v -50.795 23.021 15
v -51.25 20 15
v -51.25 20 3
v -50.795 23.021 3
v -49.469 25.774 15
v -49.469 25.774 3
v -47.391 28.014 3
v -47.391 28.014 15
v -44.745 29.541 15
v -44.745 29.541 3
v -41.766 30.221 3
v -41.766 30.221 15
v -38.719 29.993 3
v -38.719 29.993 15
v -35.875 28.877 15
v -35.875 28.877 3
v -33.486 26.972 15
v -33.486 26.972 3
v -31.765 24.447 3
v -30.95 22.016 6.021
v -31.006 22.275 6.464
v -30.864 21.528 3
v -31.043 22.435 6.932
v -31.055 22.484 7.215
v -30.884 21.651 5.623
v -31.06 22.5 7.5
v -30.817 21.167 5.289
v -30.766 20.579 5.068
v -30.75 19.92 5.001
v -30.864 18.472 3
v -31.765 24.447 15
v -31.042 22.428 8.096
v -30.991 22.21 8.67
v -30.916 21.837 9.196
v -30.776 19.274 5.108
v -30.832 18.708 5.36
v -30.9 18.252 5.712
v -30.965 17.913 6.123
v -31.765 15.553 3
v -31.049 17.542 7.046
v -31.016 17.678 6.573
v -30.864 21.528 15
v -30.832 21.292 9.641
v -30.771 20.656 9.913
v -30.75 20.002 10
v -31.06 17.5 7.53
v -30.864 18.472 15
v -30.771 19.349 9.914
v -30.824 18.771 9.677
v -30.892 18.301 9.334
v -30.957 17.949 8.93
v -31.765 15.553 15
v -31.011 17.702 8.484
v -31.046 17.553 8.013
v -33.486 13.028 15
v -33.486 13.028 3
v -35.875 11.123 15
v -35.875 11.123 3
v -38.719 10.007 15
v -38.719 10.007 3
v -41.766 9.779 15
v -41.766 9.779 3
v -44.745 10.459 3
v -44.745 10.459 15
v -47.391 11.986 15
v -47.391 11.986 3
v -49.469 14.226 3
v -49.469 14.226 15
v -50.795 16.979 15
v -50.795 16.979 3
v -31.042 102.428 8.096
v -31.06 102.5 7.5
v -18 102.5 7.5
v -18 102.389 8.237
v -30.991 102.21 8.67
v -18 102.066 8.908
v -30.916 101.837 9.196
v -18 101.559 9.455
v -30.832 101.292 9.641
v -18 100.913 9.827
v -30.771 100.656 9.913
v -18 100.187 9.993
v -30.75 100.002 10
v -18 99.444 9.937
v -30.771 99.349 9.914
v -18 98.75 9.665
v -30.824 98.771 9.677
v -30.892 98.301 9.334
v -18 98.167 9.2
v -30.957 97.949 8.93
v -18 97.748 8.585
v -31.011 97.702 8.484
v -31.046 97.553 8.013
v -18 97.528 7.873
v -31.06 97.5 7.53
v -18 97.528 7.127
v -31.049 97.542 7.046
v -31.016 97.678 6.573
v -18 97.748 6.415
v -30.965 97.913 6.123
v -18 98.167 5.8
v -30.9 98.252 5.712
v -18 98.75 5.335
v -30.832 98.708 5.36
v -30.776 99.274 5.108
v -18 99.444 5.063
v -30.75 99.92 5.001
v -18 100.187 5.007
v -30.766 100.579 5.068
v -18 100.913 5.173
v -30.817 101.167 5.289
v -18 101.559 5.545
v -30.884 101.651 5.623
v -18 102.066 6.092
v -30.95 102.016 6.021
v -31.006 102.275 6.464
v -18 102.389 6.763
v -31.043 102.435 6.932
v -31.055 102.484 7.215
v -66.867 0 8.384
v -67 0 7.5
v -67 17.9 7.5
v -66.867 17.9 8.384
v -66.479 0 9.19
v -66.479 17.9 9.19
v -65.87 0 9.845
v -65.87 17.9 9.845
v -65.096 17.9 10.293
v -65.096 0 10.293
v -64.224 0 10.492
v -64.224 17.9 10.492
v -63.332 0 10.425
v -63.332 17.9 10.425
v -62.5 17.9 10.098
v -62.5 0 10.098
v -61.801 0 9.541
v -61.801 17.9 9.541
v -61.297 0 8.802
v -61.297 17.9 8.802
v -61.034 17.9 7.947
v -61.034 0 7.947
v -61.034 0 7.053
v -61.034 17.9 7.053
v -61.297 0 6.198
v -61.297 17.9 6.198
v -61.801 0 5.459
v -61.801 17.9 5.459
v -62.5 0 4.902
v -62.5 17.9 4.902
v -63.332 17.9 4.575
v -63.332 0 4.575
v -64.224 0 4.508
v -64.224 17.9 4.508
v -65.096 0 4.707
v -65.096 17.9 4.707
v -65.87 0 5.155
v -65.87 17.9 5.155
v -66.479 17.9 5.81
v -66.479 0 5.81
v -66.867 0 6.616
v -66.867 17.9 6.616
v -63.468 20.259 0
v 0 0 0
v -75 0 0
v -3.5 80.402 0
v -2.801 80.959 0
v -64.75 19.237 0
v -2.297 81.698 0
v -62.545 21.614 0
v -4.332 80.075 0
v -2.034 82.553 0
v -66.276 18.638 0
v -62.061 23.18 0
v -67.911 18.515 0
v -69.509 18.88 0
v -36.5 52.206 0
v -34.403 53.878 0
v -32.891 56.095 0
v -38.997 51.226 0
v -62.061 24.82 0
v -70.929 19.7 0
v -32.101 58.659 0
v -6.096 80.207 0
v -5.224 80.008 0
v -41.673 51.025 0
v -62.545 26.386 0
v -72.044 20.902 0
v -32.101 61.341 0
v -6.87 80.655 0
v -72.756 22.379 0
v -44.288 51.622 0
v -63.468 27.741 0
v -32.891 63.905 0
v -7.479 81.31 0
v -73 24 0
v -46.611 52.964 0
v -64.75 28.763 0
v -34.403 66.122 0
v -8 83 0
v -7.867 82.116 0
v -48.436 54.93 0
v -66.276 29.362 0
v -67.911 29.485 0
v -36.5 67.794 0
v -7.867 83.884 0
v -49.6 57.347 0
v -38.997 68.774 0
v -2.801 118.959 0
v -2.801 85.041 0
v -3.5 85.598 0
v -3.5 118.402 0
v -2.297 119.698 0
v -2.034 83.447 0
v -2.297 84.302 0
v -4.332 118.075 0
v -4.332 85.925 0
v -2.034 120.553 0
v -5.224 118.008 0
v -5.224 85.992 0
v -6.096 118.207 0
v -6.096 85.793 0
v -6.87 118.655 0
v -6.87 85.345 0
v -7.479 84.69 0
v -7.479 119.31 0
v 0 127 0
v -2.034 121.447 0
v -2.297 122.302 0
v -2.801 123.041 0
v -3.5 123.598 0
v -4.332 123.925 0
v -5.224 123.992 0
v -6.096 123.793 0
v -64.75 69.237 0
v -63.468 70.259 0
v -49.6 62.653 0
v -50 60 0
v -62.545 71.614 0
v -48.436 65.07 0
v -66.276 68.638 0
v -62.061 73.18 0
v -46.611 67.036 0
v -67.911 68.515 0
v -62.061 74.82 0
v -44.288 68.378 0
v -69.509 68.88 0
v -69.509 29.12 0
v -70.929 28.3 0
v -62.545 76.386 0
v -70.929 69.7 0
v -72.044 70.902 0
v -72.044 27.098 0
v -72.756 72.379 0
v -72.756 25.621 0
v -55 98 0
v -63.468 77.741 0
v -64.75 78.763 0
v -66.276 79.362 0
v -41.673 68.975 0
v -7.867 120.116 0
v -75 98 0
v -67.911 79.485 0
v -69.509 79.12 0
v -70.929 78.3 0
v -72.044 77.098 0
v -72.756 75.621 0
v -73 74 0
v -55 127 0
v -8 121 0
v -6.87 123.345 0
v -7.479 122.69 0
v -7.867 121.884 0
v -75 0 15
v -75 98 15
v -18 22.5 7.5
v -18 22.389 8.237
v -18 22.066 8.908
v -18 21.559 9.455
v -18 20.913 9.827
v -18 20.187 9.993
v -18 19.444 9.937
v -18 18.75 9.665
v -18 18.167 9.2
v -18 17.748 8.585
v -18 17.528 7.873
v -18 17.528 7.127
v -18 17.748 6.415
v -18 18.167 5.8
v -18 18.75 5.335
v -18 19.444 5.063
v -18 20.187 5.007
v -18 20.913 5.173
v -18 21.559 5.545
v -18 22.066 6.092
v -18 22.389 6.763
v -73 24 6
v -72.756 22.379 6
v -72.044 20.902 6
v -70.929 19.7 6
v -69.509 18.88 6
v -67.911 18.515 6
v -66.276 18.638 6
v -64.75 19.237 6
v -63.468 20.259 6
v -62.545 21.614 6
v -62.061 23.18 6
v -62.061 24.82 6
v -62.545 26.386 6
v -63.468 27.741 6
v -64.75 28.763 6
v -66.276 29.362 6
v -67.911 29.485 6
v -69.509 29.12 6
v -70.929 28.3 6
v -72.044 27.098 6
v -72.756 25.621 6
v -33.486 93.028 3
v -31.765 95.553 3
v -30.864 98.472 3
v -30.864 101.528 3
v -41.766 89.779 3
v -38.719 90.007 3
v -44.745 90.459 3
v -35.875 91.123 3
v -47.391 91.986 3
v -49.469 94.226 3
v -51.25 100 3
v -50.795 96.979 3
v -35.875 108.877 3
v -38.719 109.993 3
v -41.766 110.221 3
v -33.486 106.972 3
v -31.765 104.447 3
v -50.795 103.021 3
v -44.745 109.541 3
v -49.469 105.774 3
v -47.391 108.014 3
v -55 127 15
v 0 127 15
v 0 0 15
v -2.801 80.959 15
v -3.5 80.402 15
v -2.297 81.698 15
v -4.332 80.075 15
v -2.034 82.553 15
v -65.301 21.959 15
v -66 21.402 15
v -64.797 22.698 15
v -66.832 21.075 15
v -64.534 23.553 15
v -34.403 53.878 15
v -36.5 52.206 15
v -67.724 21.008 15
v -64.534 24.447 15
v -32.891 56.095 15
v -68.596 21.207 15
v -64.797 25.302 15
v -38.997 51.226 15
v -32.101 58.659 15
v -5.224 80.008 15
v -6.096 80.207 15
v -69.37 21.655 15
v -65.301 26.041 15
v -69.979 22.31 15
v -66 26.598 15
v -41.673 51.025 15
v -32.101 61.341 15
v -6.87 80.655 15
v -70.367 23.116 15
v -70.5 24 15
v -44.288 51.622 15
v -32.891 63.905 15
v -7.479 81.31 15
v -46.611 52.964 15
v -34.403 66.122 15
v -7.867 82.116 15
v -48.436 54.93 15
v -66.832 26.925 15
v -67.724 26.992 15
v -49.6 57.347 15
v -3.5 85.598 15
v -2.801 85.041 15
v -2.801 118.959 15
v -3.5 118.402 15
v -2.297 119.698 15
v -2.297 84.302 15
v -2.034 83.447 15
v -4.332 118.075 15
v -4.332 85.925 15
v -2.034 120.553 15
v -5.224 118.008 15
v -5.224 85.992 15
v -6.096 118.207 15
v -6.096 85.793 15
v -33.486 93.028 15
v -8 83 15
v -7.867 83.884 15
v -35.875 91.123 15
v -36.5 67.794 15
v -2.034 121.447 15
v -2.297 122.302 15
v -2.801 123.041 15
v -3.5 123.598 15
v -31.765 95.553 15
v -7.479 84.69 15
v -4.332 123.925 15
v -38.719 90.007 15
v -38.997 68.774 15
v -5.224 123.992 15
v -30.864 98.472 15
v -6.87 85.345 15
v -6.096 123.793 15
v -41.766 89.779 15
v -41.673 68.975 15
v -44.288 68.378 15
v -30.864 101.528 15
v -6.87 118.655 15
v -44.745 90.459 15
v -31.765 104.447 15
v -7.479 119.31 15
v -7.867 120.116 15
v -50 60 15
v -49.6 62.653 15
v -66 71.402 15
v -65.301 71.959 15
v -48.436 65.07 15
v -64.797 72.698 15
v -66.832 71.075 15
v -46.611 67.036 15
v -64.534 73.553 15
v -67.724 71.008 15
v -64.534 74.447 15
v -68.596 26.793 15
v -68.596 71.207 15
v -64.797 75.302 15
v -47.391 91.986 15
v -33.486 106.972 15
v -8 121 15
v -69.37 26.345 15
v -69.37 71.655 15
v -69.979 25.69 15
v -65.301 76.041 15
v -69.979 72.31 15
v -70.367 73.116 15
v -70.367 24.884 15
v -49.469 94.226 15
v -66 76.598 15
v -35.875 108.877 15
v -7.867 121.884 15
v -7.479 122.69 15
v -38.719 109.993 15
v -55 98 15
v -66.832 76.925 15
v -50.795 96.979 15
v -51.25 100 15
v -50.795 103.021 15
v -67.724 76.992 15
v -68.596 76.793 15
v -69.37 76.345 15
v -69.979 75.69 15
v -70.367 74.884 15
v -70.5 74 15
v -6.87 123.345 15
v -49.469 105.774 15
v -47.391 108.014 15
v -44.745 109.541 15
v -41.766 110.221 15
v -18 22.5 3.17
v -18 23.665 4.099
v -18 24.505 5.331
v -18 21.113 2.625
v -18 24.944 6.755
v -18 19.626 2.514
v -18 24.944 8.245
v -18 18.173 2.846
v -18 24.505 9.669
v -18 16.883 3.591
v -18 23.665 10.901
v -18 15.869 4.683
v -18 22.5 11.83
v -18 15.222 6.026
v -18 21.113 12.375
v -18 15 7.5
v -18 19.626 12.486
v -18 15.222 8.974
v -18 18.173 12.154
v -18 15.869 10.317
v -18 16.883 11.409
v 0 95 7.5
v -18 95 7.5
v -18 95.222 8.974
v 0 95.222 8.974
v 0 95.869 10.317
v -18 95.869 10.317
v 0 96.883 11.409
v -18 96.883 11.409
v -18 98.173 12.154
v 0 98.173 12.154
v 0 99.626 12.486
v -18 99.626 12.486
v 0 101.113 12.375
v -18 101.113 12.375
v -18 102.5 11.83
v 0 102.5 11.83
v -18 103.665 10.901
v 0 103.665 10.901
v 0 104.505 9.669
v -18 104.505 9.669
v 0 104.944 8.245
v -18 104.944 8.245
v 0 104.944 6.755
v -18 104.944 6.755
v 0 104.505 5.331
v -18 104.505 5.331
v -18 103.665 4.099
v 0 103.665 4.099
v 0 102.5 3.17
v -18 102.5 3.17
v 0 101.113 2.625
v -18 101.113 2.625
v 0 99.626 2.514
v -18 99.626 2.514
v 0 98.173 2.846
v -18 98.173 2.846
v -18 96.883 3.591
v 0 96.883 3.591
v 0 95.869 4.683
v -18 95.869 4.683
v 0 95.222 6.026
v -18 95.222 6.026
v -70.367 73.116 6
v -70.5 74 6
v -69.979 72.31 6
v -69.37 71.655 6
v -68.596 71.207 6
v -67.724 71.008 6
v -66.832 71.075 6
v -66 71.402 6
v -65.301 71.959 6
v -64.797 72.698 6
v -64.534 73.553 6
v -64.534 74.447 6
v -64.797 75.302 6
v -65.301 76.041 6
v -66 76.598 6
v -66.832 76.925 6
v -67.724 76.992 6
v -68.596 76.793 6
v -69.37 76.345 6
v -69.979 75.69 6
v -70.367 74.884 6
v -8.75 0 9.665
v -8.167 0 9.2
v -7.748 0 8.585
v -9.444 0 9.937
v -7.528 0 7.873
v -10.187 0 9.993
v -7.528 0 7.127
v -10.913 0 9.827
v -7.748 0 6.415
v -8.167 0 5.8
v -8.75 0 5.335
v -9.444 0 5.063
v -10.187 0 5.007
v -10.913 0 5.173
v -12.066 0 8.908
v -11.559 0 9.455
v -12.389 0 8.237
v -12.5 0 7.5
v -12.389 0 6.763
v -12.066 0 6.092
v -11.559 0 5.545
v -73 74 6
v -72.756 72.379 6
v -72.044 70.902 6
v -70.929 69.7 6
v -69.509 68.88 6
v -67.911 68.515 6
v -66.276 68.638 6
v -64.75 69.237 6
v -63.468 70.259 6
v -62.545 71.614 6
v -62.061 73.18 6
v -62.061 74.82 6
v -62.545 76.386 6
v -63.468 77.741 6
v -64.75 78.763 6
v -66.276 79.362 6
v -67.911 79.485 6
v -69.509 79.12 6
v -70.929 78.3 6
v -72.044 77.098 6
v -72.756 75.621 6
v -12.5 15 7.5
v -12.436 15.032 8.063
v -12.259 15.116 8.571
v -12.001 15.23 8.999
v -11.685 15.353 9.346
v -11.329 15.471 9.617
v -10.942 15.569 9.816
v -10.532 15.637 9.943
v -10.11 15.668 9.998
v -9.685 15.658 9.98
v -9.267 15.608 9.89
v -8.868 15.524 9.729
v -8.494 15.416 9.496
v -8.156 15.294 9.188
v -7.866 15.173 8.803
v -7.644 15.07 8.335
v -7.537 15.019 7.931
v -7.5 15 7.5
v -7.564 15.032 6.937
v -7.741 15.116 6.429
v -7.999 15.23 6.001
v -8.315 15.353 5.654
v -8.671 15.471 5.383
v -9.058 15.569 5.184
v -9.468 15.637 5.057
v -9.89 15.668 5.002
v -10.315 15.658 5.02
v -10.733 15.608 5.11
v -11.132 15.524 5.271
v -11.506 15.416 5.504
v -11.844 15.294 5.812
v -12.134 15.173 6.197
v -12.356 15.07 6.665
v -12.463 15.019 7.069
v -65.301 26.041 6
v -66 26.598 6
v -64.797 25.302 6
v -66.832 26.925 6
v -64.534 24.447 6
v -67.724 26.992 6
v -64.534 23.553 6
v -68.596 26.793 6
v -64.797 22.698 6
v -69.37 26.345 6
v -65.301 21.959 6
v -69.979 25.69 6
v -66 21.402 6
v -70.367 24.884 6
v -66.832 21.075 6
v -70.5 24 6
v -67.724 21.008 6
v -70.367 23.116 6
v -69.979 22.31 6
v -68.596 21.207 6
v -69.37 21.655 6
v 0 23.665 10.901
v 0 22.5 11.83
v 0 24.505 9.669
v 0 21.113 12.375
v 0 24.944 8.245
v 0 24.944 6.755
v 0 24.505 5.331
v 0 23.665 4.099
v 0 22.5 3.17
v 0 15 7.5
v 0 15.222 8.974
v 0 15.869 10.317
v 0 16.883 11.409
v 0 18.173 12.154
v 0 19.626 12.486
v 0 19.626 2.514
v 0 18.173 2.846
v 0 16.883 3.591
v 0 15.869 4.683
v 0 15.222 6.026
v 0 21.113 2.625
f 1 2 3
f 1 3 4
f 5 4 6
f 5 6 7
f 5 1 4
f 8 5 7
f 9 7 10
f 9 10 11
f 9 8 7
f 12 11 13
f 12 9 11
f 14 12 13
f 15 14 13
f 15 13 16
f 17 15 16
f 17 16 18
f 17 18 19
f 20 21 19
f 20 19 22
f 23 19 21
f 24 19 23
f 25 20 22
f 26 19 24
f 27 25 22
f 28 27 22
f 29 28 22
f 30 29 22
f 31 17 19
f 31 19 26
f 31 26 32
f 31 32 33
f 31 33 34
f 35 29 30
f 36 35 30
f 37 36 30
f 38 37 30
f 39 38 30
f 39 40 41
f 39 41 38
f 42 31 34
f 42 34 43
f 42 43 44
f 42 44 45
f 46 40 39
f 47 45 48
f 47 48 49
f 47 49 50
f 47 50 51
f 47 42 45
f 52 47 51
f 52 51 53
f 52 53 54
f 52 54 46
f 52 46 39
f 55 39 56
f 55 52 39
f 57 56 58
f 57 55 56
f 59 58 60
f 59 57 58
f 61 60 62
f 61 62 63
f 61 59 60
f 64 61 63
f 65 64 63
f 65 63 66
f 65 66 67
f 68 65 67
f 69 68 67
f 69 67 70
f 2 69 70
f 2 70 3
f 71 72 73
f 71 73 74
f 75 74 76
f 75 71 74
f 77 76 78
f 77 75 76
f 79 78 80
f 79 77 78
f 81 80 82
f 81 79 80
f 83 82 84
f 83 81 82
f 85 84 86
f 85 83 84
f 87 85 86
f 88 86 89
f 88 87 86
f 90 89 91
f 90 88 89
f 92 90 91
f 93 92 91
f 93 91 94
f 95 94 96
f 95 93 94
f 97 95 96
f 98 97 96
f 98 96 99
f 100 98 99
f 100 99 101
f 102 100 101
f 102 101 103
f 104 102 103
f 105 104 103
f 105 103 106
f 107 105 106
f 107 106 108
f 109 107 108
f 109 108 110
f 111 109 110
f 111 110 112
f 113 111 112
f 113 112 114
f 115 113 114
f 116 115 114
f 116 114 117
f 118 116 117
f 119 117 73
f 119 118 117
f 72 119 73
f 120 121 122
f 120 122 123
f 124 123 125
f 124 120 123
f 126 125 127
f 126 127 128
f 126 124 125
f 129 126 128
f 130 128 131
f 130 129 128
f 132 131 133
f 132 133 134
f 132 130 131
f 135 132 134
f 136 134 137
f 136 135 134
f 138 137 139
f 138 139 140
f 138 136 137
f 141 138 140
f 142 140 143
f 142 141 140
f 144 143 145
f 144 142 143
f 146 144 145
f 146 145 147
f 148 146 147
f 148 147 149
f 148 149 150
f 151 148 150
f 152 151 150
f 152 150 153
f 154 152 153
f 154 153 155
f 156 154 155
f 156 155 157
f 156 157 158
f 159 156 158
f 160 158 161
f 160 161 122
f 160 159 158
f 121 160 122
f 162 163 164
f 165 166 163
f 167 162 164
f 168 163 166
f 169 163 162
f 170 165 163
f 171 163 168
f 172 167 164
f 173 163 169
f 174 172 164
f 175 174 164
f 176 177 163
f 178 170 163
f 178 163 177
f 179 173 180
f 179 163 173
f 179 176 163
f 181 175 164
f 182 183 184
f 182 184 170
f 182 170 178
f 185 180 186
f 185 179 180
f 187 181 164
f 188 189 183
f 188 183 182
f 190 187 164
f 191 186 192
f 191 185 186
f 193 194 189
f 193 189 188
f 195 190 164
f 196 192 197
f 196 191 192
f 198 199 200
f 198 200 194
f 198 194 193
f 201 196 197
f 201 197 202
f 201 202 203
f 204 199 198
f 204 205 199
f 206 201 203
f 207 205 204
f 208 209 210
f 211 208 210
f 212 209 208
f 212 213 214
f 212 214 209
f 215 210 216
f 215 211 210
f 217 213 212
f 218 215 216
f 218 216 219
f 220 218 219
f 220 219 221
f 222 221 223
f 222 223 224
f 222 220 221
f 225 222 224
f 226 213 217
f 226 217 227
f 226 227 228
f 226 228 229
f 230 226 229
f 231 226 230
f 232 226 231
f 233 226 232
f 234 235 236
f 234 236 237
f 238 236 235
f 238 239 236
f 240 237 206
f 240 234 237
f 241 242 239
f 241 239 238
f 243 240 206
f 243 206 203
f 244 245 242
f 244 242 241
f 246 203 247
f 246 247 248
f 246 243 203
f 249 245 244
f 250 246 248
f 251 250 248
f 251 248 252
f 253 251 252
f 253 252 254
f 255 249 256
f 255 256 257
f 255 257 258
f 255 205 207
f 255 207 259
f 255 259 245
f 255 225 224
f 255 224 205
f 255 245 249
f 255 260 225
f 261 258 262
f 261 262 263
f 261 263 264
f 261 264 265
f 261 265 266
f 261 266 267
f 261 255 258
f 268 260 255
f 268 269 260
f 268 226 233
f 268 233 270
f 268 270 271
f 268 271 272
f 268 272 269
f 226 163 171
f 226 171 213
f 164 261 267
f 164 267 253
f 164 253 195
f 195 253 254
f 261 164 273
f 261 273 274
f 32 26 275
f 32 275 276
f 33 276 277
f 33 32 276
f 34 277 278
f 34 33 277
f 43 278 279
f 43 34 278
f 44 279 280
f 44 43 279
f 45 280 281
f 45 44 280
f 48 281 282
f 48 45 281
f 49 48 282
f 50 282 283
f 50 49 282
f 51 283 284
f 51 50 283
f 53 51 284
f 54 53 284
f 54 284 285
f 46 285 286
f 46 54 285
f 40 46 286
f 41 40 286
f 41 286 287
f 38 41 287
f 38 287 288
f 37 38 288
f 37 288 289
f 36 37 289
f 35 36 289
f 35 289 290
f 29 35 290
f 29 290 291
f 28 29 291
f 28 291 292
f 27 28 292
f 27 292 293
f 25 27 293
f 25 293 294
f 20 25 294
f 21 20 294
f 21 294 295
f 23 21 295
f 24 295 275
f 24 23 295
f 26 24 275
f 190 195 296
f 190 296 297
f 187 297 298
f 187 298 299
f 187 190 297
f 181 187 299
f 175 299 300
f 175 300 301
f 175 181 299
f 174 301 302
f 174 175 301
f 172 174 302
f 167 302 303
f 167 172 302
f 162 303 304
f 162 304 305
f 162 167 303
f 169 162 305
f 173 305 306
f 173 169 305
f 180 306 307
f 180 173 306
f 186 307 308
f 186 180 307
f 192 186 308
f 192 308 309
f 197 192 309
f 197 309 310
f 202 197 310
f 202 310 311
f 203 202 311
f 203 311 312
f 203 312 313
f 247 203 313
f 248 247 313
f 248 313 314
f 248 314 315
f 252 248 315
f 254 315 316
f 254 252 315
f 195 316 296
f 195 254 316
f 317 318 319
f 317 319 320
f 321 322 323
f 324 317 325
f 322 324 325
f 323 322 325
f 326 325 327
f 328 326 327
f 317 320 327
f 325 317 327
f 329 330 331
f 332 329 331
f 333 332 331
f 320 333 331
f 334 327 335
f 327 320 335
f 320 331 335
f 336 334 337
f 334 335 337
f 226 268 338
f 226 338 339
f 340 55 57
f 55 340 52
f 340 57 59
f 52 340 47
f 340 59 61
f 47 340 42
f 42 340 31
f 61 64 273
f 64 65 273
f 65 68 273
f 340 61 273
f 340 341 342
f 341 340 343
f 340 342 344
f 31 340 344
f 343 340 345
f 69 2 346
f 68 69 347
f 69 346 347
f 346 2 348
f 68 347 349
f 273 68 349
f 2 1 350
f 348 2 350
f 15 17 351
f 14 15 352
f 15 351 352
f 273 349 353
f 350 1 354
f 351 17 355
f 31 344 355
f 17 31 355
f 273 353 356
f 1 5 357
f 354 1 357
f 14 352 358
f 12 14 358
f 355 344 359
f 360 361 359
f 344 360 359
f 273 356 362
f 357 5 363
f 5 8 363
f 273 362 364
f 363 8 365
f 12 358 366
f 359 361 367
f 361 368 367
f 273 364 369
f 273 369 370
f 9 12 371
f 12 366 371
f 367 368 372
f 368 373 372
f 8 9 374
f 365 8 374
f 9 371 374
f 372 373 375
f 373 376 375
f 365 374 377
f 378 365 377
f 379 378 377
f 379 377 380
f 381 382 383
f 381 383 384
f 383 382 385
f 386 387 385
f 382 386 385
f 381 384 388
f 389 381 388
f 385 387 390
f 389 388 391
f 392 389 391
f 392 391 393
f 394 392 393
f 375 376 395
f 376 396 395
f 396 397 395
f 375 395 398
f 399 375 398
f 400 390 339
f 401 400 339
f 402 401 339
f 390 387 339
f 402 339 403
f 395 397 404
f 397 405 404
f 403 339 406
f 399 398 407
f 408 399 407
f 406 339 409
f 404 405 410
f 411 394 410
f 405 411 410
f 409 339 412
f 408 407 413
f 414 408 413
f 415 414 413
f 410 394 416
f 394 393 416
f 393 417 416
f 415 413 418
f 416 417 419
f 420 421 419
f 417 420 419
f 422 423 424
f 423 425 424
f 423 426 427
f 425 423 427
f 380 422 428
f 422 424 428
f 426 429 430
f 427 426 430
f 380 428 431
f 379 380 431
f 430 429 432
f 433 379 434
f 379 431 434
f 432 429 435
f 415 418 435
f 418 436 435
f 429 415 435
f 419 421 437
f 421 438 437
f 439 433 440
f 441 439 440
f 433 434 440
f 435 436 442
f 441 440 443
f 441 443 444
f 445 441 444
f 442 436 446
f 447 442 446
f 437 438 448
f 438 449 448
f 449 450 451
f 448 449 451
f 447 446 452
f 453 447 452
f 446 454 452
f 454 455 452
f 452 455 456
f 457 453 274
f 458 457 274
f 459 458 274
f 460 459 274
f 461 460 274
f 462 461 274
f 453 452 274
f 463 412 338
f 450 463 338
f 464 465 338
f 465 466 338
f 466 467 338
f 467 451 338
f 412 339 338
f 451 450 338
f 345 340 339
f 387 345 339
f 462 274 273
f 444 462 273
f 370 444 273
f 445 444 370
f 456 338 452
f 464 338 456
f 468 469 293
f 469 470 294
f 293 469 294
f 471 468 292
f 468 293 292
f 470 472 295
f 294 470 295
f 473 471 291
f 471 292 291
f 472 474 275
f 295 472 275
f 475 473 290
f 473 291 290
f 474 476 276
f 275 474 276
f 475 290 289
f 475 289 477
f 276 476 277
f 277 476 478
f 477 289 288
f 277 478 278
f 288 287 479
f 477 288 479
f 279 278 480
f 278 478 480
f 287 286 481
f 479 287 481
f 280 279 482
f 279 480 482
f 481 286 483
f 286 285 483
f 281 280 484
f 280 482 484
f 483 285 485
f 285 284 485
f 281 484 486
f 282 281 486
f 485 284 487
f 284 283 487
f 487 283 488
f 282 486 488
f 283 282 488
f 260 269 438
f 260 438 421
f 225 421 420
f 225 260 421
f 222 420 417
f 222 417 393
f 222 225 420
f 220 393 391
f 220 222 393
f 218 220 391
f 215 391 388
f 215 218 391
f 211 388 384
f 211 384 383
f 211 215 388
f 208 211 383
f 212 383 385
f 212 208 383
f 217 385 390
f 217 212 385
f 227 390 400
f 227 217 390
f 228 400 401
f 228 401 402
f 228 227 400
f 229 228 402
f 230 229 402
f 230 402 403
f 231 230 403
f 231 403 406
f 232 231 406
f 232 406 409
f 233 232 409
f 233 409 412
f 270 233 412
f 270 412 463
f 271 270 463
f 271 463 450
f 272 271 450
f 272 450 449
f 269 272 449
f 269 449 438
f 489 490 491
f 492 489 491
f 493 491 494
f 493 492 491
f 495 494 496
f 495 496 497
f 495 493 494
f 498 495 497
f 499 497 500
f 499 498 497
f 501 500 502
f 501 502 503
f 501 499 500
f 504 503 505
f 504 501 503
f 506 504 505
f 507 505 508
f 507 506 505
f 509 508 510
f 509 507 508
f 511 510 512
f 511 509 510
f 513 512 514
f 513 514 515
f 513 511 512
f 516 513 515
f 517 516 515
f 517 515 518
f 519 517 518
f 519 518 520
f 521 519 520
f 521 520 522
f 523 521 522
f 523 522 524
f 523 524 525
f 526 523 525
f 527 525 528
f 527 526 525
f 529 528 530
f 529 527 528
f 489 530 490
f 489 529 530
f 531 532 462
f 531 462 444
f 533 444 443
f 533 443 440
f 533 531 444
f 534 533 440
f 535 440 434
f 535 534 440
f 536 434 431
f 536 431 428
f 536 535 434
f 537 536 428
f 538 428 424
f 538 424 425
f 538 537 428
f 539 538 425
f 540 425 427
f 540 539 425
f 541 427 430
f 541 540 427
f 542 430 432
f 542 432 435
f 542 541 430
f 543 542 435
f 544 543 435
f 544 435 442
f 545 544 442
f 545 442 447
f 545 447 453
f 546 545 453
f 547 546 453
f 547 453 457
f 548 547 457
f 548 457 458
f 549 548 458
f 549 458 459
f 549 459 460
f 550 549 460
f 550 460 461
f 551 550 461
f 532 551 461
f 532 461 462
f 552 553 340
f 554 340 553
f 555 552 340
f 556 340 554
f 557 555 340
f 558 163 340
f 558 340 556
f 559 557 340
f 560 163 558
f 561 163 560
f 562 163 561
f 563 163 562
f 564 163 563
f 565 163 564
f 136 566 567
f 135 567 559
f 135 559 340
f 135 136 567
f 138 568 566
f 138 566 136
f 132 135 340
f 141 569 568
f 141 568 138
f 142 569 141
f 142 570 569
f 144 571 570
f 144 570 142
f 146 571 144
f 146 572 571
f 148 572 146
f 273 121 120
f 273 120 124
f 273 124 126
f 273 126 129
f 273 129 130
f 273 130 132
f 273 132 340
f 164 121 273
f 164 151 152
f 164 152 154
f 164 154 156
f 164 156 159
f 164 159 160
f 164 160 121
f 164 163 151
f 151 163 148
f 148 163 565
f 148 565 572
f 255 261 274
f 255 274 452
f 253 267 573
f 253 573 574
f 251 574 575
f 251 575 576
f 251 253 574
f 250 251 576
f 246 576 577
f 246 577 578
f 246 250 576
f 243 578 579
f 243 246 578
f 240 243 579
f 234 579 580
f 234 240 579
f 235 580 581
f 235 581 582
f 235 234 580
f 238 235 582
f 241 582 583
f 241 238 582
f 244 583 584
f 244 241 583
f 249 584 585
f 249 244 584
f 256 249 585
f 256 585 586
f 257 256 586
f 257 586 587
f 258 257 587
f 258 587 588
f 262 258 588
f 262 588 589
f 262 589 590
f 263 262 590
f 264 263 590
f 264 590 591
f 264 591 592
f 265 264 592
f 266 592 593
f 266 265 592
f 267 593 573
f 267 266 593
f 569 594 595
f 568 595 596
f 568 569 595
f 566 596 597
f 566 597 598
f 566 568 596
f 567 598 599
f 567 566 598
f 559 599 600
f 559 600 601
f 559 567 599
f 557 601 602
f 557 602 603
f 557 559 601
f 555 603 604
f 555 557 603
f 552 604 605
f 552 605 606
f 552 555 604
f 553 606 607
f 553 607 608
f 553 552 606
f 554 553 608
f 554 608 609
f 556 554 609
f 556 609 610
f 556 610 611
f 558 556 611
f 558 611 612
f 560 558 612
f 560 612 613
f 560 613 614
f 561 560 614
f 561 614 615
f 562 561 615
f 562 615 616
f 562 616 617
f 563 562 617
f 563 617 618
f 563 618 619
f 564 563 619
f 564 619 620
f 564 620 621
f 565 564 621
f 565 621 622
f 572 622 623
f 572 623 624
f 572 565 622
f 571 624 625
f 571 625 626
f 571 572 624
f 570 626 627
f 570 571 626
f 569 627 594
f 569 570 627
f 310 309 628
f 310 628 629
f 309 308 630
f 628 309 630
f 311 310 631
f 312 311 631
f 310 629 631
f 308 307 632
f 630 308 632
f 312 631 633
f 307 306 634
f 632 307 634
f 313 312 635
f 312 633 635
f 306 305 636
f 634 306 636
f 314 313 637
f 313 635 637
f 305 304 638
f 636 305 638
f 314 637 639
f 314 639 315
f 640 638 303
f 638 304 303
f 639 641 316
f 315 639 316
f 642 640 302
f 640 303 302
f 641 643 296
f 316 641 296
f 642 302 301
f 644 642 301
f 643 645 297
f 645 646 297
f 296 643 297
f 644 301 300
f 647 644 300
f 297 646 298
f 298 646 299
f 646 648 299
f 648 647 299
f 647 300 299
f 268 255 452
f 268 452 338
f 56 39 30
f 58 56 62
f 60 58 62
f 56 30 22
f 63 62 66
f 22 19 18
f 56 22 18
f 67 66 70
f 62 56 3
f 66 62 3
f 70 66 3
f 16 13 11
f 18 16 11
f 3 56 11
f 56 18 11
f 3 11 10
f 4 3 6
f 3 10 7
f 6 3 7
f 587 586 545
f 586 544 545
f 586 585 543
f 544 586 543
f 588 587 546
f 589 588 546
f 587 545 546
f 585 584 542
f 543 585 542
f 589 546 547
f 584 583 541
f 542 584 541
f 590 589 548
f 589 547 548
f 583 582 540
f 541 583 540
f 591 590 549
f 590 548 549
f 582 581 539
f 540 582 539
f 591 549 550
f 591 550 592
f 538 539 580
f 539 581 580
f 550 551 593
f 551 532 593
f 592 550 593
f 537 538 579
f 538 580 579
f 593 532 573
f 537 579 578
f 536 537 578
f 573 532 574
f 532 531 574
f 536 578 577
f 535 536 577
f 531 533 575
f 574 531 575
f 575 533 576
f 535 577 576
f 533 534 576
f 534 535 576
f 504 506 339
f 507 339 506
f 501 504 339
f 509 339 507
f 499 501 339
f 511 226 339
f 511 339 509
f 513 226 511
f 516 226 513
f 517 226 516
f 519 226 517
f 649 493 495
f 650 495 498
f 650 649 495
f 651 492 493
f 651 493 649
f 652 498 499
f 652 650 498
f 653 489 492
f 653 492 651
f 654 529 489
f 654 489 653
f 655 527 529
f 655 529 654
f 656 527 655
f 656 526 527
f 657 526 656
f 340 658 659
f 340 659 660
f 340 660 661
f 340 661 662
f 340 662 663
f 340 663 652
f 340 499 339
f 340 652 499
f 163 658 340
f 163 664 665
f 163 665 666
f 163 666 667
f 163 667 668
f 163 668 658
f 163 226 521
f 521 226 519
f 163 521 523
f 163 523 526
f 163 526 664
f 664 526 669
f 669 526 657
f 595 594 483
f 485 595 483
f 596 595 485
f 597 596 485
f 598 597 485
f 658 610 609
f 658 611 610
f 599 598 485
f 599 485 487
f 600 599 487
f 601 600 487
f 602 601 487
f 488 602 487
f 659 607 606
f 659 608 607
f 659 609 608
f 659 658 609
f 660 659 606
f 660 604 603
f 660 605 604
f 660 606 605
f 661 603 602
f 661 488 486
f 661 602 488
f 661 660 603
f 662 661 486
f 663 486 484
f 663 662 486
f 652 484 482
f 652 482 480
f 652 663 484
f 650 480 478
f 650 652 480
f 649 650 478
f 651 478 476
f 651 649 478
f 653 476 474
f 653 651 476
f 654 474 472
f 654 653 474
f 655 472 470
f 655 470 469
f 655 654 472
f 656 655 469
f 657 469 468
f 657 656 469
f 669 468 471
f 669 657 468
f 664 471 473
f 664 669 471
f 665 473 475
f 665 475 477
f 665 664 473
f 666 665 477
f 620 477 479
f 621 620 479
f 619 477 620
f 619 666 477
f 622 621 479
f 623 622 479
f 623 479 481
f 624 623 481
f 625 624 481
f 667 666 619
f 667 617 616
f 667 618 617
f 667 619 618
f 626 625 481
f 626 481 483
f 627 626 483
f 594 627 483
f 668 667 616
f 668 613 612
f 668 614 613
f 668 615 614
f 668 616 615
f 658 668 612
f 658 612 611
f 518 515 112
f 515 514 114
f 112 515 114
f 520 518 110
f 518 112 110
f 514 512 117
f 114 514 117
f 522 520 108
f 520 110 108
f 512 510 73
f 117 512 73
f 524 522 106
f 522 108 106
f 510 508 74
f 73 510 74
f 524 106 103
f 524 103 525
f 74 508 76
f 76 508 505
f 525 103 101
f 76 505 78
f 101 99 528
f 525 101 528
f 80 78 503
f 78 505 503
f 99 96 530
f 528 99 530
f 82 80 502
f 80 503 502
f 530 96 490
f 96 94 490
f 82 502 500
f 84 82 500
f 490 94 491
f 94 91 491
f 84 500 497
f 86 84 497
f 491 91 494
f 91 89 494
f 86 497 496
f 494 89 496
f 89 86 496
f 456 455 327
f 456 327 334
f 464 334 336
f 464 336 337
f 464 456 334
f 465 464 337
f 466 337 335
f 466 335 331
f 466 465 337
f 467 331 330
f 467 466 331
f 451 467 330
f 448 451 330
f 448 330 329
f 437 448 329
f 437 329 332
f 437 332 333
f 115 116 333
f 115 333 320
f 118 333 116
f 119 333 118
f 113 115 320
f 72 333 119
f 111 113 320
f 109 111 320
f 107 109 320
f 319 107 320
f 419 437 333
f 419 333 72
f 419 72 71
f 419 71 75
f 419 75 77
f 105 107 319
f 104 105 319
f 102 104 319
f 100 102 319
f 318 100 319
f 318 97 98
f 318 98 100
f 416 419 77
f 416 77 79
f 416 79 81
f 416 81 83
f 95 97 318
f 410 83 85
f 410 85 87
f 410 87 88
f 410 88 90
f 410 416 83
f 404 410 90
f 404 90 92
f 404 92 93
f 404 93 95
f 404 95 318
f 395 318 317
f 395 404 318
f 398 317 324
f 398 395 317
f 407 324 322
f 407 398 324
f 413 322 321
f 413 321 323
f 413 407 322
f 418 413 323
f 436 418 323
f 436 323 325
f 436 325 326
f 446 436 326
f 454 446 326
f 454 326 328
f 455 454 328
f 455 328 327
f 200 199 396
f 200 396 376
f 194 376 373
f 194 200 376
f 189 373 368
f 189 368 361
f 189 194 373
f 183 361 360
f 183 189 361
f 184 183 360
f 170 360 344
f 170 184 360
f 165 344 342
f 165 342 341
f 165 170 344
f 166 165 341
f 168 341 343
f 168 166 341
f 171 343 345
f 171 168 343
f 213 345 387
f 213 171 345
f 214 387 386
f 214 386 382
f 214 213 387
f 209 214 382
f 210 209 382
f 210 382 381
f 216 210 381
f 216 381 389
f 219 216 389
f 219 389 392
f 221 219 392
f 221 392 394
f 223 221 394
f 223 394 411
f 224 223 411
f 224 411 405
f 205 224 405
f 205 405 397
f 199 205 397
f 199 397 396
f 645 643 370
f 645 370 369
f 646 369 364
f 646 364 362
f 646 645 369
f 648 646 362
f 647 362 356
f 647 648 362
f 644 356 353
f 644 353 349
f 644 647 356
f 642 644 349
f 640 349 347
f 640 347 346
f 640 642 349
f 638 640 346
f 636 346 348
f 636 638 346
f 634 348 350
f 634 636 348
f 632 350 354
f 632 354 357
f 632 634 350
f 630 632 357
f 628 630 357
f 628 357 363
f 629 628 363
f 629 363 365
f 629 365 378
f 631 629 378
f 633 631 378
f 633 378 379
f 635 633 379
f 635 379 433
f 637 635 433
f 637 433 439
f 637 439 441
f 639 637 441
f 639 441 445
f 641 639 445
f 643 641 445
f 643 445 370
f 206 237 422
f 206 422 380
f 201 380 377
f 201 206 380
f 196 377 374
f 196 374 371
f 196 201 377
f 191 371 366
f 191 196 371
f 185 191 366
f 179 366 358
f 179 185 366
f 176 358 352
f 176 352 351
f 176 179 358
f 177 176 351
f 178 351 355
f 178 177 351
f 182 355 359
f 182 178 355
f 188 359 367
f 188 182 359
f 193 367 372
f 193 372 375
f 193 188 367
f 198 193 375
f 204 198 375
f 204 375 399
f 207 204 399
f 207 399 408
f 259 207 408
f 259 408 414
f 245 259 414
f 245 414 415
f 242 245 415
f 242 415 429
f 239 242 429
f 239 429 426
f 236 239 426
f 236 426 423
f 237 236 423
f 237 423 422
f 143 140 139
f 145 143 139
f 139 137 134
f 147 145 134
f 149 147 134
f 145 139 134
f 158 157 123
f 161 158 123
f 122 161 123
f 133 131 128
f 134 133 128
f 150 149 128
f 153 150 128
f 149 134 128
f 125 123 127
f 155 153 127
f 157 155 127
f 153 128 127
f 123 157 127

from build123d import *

# Parameters (mm, degrees)
F1_DEPTH  = 15
F2_R      = 3
F2_R_2    = 9
F3_DEPTH  = 15.001
F4_R      = 5.5
F5_DEPTH  = 6
F6_R      = 10.25
F7_DEPTH  = 12
F9_D      = 5
F9_DEPTH  = 35
F10_R     = 5
F10_R_2   = 2.5
F11_DEPTH = 18
F12_R     = 3
F12_R_2   = 2.5
F13_DEPTH = 17.9


with BuildPart() as f1:
    # F0 (on Top) → F1 (new body)
    with BuildSketch(Plane.XY):
        Polygon((0, 127), (0, 0), (75, 0), (75, 98), (55, 98), (55, 127), align=None)
    extrude(amount=F1_DEPTH)

    # F2 (on face) → F3 (cut, through all)
    with BuildSketch(Plane(origin=(0, 0, 0), x_dir=(1, 0, 0), z_dir=(0, 0, -1))):
        with Locations((5, -121)):
            Circle(F2_R)
        with Locations((5, -83)):
            Circle(F2_R)
        with Locations((41, -60)):
            Circle(F2_R_2)
        with Locations((67.5, -24)):
            Circle(F2_R)
        with Locations((67.5, -74)):
            Circle(F2_R)
    extrude(amount=-F3_DEPTH, mode=Mode.SUBTRACT)

    # F4 (on face) → F5 (cut)
    with BuildSketch(Plane(origin=(0, 0, 0), x_dir=(1, 0, 0), z_dir=(0, 0, -1))):
        with Locations((67.5, -74)):
            Circle(F4_R)
        with Locations((67.5, -24)):
            Circle(F4_R)
    extrude(amount=-F5_DEPTH, mode=Mode.SUBTRACT)

    # F6 (on face) → F7 (cut)
    with BuildSketch(Plane.XY.offset(15)):
        with Locations((41, 100)):
            Circle(F6_R)
        with Locations((41, 20)):
            Circle(F6_R)
    extrude(amount=-F7_DEPTH, mode=Mode.SUBTRACT)

    # F9
    with Locations(Plane(origin=(0, 0, 0), x_dir=(0, -1, 0), z_dir=(-1, 0, 0))):
        with Locations((-100, 7.5), (-20, 7.5)):
            Hole(F9_D / 2, depth=F9_DEPTH)

    # F10 (on face) → F11 (cut)
    with BuildSketch(Plane(origin=(0, 0, 0), x_dir=(0, -1, 0), z_dir=(-1, 0, 0))):
        with Locations((-100, 7.5)):
            Circle(F10_R)
        with Locations((-100, 7.5)):
            Circle(F10_R_2, mode=Mode.SUBTRACT)
        with Locations((-20, 7.5)):
            Circle(F10_R)
        with Locations((-20, 7.5)):
            Circle(F10_R_2, mode=Mode.SUBTRACT)
    extrude(amount=-F11_DEPTH, mode=Mode.SUBTRACT)

    # F12 (on face) → F13 (cut)
    with BuildSketch(Plane.XZ):
        with Locations((64, 7.5)):
            Circle(F12_R)
        with Locations((10, 7.5)):
            Circle(F12_R_2)
    extrude(amount=-F13_DEPTH, mode=Mode.SUBTRACT)


with BuildPart() as f14_1:
    # F14: instance of F1
    add(f1.part.mirror(Plane(origin=(0, 63.814533, 7.5), x_dir=(0, -1, 0), z_dir=(-1, 0, 0))))


solid = f14_1.part
